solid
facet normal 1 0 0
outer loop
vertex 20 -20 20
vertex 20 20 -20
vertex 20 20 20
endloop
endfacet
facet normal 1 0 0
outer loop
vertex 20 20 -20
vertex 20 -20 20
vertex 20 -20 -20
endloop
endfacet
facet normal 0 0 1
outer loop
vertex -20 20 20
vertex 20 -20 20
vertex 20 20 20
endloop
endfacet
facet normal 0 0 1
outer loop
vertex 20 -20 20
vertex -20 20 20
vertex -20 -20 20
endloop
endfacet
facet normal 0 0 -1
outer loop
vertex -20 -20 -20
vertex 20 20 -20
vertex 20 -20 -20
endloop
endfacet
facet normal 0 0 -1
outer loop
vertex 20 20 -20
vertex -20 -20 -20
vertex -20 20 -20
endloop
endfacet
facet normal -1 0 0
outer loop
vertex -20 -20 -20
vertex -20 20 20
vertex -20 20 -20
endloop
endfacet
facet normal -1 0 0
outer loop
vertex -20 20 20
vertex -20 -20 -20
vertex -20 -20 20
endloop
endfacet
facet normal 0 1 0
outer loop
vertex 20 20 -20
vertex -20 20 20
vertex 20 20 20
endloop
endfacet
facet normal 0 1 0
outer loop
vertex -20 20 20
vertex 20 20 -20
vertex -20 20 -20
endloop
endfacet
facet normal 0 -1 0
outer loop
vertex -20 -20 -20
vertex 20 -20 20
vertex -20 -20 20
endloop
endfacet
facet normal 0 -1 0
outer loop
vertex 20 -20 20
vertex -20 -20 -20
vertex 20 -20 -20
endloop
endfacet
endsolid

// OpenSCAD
cube_size = 50; 
wall_thickness = 5; 
fillet_radius = 1; 
 
difference() { 
    %cube(cube_size, center = true); 
     
    cube(cube_size - 2 * wall_thickness, center = true); 
   
    for (x = [-1, 1]) 
    for (y = [-1, 1]) 
    for (z = [-1, 1]) { 
        translate([x * (cube_size / 2 - fillet_radius), y * (cube_size / 2 - fillet_radius), z * 
(cube_size / 2 - fillet_radius)]) 
            sphere(fillet_radius); 
    } 
} 
